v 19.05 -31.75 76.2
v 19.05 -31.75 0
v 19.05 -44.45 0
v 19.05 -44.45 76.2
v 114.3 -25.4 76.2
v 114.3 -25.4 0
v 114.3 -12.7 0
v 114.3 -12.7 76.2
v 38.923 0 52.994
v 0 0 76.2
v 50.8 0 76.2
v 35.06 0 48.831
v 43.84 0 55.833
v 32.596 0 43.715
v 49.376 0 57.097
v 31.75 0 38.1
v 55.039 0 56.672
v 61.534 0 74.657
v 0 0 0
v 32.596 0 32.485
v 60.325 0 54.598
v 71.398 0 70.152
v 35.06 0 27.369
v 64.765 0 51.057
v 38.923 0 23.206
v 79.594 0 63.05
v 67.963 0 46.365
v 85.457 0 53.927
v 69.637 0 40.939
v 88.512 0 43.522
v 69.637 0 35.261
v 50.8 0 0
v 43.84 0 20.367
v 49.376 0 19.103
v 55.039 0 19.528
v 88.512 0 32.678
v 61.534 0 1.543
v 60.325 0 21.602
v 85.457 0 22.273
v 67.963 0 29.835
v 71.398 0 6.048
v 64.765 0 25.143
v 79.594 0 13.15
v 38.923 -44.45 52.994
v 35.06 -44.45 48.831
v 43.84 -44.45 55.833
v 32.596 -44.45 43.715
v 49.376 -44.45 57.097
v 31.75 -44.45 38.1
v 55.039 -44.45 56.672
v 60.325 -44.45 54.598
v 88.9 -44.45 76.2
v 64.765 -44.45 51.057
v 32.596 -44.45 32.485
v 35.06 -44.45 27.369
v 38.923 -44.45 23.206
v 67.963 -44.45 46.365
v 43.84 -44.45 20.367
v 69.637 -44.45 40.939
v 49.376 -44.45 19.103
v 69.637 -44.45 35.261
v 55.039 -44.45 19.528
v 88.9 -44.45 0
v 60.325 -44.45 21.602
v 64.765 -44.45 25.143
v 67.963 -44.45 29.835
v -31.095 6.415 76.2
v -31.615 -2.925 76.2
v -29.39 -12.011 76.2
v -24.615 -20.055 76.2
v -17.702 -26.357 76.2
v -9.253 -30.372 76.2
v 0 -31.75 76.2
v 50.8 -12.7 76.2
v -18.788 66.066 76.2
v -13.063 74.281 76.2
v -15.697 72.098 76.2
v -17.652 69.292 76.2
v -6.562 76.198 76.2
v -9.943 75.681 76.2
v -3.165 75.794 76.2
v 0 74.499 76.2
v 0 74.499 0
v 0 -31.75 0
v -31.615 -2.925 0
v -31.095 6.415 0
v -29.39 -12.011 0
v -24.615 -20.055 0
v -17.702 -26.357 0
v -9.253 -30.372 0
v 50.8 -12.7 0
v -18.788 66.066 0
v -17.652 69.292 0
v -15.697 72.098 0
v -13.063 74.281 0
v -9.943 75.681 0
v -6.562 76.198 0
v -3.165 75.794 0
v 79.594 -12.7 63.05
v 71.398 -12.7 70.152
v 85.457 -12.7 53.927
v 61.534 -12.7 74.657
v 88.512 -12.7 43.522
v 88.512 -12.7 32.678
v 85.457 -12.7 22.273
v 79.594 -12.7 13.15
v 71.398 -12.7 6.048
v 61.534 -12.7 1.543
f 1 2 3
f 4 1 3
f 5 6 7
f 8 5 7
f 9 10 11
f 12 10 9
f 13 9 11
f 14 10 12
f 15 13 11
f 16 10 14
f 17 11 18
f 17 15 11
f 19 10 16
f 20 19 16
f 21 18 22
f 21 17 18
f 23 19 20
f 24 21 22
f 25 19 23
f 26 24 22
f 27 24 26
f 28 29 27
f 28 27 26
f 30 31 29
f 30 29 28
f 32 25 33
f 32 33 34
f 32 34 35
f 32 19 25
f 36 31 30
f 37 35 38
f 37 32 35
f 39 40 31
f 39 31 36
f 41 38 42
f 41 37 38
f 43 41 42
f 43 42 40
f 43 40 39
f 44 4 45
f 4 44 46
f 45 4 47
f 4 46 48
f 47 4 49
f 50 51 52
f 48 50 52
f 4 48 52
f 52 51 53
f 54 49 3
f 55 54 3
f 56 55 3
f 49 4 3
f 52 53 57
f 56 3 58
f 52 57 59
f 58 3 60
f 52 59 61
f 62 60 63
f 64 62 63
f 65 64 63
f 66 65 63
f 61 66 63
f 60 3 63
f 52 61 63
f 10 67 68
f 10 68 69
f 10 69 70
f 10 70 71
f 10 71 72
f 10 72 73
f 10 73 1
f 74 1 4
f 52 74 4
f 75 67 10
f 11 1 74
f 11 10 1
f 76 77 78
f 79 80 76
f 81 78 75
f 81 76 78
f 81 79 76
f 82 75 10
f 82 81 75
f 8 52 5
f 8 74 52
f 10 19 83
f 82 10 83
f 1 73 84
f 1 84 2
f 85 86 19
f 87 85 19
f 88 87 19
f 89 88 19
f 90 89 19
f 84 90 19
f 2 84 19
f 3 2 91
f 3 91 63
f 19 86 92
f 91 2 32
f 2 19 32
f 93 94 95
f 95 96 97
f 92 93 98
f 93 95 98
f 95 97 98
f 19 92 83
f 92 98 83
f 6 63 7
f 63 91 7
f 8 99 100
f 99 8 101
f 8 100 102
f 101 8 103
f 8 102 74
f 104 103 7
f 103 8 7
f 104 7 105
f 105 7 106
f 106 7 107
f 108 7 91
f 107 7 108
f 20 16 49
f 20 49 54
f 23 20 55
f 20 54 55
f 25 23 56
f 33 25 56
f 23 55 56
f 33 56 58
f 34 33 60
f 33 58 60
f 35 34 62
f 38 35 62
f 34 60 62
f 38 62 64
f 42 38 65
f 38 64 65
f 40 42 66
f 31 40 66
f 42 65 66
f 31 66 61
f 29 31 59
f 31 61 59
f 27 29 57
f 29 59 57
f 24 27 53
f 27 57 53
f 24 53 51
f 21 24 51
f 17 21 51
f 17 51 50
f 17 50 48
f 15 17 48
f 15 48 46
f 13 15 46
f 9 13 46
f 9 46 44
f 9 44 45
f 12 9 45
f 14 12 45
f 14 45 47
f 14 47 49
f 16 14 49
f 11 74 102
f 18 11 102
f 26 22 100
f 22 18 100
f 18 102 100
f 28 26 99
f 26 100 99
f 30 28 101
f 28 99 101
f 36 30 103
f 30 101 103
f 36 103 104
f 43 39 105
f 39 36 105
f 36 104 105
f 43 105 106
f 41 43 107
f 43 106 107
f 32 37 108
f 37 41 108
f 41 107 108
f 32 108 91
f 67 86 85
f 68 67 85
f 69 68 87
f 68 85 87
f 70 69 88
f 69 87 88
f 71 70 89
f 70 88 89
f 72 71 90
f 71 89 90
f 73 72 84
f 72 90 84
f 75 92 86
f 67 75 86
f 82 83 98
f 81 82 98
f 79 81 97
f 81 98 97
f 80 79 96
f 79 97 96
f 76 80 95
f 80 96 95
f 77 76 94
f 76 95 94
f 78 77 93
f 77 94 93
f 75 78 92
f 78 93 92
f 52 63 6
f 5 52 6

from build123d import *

# Parameters (mm, degrees)
BOSS_EXTRUDE1_DEPTH        = 76.2
SKETCH2_R                  = 38.1
BOSS_EXTRUDE2_DEPTH        = 12.7
F_3_4_1_5_DIAMETER_HOLE1_D = 38.1


with BuildPart() as part:
    # Sketch1 → Boss-Extrude1 (new body)
    with BuildSketch(Plane.XY):
        with BuildLine():
            ThreePointArc((0, 74.498522628), (-11.550198291, 75.086541233), (-18.788031752, 66.066196825))
            Line((-18.788031752, 66.066196825), (-31.095079379, 6.415492062))
            ThreePointArc((-31.095079379, 6.415492062), (-24.614572645, -20.054558422), (0, -31.75))
            Line((0, -31.75), (19.05, -31.75))
            Line((19.05, -31.75), (19.05, -44.45))
            Line((19.05, -44.45), (88.9, -44.45))
            Line((88.9, -44.45), (114.3, -25.4))
            Line((114.3, -25.4), (114.3, -12.7))
            Line((114.3, -12.7), (50.8, -12.7))
            Line((50.8, -12.7), (50.8, 0))
            Line((50.8, 0), (0, 0))
            Line((0, 0), (0, 74.498522628))
        make_face()
    extrude(amount=BOSS_EXTRUDE1_DEPTH)

    # Sketch2 → Boss-Extrude2 (add)
    with BuildSketch(Plane(origin=(0, -12.7, 0), x_dir=(1, 0, 0), z_dir=(0, 1, 0))):
        with Locations((50.8, -38.1)):
            Circle(SKETCH2_R)
    extrude(amount=BOSS_EXTRUDE2_DEPTH)

    # 3/4 (1.5) Diameter Hole1 (through all)
    with Locations(Plane(origin=(0, 0, 0), x_dir=(1, 0, 0), z_dir=(0, 1, 0))):
        with Locations((50.8, -38.1)):
            Hole(F_3_4_1_5_DIAMETER_HOLE1_D / 2)


solid = part.part
